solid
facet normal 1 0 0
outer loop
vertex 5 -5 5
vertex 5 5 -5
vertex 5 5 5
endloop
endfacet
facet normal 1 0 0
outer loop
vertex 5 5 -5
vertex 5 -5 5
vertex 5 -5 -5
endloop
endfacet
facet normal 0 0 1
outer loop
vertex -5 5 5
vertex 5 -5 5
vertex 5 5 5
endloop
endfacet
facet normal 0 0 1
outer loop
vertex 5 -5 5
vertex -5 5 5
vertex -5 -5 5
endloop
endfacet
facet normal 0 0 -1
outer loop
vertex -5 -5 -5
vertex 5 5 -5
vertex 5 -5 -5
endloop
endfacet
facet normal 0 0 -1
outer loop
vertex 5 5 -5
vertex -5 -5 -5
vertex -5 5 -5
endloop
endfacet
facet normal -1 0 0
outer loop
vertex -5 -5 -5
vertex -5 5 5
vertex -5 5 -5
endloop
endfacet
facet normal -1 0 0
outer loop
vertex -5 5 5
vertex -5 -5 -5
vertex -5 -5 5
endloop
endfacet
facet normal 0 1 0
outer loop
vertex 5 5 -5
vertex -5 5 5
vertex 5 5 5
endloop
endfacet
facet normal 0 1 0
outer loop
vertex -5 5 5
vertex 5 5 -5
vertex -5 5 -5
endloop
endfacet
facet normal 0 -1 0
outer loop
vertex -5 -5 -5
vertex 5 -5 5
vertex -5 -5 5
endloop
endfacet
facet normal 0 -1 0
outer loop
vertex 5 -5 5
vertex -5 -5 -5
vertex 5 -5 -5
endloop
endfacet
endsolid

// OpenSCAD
// Begin.
union() {
    union() {
        union() {
            difference() {
                union() {
                    translate([0, 0, 0])
                    sphere(r = 57, $fn = 12);

                    translate([0, 0, 0])
                    sphere(r = 57, $fn = 12);
                }

                union() {
                    translate([0, 0, 0])
                    sphere(r = 57, $fn = 12);

                    translate([0, 0, 0])
                    sphere(r = 57, $fn = 12);
                }
            }

            intersection() {
                difference() {
                    translate([0, 0, 0])
                    sphere(r = 57, $fn = 12);

                    translate([0, 0, 0])
                    sphere(r = 57, $fn = 12);
                }

                translate([0, 0, 0])
                sphere(r = 57, $fn = 12);
            }
        }

        difference() {
            union() {
                difference() {
                    translate([0, 0, 0])
                    sphere(r = 57, $fn = 12);

                    translate([0, 0, 0])
                    sphere(r = 57, $fn = 12);
                }

                intersection() {
                    rotate([0, -0, 0])
                    translate([0, 0, 0])
                    cube(size = [10, 10, 10], center = true);

                    translate([0, 0, 0])
                    sphere(r = 57, $fn = 12);
                }
            }

            intersection() {
                translate([0, 0, 0])
                sphere(r = 57, $fn = 12);

                rotate([0, -0, 0])
                translate([0, 0, 12])
                cube(size = [38, 10, 14], center = true);
            }
        }
    }

    difference() {
    translate([0, 0, 0])
    sphere(r = 57, $fn = 12);

    translate([0, 0, 0])
    sphere(r = 57, $fn = 12);
    }
}
// End.
